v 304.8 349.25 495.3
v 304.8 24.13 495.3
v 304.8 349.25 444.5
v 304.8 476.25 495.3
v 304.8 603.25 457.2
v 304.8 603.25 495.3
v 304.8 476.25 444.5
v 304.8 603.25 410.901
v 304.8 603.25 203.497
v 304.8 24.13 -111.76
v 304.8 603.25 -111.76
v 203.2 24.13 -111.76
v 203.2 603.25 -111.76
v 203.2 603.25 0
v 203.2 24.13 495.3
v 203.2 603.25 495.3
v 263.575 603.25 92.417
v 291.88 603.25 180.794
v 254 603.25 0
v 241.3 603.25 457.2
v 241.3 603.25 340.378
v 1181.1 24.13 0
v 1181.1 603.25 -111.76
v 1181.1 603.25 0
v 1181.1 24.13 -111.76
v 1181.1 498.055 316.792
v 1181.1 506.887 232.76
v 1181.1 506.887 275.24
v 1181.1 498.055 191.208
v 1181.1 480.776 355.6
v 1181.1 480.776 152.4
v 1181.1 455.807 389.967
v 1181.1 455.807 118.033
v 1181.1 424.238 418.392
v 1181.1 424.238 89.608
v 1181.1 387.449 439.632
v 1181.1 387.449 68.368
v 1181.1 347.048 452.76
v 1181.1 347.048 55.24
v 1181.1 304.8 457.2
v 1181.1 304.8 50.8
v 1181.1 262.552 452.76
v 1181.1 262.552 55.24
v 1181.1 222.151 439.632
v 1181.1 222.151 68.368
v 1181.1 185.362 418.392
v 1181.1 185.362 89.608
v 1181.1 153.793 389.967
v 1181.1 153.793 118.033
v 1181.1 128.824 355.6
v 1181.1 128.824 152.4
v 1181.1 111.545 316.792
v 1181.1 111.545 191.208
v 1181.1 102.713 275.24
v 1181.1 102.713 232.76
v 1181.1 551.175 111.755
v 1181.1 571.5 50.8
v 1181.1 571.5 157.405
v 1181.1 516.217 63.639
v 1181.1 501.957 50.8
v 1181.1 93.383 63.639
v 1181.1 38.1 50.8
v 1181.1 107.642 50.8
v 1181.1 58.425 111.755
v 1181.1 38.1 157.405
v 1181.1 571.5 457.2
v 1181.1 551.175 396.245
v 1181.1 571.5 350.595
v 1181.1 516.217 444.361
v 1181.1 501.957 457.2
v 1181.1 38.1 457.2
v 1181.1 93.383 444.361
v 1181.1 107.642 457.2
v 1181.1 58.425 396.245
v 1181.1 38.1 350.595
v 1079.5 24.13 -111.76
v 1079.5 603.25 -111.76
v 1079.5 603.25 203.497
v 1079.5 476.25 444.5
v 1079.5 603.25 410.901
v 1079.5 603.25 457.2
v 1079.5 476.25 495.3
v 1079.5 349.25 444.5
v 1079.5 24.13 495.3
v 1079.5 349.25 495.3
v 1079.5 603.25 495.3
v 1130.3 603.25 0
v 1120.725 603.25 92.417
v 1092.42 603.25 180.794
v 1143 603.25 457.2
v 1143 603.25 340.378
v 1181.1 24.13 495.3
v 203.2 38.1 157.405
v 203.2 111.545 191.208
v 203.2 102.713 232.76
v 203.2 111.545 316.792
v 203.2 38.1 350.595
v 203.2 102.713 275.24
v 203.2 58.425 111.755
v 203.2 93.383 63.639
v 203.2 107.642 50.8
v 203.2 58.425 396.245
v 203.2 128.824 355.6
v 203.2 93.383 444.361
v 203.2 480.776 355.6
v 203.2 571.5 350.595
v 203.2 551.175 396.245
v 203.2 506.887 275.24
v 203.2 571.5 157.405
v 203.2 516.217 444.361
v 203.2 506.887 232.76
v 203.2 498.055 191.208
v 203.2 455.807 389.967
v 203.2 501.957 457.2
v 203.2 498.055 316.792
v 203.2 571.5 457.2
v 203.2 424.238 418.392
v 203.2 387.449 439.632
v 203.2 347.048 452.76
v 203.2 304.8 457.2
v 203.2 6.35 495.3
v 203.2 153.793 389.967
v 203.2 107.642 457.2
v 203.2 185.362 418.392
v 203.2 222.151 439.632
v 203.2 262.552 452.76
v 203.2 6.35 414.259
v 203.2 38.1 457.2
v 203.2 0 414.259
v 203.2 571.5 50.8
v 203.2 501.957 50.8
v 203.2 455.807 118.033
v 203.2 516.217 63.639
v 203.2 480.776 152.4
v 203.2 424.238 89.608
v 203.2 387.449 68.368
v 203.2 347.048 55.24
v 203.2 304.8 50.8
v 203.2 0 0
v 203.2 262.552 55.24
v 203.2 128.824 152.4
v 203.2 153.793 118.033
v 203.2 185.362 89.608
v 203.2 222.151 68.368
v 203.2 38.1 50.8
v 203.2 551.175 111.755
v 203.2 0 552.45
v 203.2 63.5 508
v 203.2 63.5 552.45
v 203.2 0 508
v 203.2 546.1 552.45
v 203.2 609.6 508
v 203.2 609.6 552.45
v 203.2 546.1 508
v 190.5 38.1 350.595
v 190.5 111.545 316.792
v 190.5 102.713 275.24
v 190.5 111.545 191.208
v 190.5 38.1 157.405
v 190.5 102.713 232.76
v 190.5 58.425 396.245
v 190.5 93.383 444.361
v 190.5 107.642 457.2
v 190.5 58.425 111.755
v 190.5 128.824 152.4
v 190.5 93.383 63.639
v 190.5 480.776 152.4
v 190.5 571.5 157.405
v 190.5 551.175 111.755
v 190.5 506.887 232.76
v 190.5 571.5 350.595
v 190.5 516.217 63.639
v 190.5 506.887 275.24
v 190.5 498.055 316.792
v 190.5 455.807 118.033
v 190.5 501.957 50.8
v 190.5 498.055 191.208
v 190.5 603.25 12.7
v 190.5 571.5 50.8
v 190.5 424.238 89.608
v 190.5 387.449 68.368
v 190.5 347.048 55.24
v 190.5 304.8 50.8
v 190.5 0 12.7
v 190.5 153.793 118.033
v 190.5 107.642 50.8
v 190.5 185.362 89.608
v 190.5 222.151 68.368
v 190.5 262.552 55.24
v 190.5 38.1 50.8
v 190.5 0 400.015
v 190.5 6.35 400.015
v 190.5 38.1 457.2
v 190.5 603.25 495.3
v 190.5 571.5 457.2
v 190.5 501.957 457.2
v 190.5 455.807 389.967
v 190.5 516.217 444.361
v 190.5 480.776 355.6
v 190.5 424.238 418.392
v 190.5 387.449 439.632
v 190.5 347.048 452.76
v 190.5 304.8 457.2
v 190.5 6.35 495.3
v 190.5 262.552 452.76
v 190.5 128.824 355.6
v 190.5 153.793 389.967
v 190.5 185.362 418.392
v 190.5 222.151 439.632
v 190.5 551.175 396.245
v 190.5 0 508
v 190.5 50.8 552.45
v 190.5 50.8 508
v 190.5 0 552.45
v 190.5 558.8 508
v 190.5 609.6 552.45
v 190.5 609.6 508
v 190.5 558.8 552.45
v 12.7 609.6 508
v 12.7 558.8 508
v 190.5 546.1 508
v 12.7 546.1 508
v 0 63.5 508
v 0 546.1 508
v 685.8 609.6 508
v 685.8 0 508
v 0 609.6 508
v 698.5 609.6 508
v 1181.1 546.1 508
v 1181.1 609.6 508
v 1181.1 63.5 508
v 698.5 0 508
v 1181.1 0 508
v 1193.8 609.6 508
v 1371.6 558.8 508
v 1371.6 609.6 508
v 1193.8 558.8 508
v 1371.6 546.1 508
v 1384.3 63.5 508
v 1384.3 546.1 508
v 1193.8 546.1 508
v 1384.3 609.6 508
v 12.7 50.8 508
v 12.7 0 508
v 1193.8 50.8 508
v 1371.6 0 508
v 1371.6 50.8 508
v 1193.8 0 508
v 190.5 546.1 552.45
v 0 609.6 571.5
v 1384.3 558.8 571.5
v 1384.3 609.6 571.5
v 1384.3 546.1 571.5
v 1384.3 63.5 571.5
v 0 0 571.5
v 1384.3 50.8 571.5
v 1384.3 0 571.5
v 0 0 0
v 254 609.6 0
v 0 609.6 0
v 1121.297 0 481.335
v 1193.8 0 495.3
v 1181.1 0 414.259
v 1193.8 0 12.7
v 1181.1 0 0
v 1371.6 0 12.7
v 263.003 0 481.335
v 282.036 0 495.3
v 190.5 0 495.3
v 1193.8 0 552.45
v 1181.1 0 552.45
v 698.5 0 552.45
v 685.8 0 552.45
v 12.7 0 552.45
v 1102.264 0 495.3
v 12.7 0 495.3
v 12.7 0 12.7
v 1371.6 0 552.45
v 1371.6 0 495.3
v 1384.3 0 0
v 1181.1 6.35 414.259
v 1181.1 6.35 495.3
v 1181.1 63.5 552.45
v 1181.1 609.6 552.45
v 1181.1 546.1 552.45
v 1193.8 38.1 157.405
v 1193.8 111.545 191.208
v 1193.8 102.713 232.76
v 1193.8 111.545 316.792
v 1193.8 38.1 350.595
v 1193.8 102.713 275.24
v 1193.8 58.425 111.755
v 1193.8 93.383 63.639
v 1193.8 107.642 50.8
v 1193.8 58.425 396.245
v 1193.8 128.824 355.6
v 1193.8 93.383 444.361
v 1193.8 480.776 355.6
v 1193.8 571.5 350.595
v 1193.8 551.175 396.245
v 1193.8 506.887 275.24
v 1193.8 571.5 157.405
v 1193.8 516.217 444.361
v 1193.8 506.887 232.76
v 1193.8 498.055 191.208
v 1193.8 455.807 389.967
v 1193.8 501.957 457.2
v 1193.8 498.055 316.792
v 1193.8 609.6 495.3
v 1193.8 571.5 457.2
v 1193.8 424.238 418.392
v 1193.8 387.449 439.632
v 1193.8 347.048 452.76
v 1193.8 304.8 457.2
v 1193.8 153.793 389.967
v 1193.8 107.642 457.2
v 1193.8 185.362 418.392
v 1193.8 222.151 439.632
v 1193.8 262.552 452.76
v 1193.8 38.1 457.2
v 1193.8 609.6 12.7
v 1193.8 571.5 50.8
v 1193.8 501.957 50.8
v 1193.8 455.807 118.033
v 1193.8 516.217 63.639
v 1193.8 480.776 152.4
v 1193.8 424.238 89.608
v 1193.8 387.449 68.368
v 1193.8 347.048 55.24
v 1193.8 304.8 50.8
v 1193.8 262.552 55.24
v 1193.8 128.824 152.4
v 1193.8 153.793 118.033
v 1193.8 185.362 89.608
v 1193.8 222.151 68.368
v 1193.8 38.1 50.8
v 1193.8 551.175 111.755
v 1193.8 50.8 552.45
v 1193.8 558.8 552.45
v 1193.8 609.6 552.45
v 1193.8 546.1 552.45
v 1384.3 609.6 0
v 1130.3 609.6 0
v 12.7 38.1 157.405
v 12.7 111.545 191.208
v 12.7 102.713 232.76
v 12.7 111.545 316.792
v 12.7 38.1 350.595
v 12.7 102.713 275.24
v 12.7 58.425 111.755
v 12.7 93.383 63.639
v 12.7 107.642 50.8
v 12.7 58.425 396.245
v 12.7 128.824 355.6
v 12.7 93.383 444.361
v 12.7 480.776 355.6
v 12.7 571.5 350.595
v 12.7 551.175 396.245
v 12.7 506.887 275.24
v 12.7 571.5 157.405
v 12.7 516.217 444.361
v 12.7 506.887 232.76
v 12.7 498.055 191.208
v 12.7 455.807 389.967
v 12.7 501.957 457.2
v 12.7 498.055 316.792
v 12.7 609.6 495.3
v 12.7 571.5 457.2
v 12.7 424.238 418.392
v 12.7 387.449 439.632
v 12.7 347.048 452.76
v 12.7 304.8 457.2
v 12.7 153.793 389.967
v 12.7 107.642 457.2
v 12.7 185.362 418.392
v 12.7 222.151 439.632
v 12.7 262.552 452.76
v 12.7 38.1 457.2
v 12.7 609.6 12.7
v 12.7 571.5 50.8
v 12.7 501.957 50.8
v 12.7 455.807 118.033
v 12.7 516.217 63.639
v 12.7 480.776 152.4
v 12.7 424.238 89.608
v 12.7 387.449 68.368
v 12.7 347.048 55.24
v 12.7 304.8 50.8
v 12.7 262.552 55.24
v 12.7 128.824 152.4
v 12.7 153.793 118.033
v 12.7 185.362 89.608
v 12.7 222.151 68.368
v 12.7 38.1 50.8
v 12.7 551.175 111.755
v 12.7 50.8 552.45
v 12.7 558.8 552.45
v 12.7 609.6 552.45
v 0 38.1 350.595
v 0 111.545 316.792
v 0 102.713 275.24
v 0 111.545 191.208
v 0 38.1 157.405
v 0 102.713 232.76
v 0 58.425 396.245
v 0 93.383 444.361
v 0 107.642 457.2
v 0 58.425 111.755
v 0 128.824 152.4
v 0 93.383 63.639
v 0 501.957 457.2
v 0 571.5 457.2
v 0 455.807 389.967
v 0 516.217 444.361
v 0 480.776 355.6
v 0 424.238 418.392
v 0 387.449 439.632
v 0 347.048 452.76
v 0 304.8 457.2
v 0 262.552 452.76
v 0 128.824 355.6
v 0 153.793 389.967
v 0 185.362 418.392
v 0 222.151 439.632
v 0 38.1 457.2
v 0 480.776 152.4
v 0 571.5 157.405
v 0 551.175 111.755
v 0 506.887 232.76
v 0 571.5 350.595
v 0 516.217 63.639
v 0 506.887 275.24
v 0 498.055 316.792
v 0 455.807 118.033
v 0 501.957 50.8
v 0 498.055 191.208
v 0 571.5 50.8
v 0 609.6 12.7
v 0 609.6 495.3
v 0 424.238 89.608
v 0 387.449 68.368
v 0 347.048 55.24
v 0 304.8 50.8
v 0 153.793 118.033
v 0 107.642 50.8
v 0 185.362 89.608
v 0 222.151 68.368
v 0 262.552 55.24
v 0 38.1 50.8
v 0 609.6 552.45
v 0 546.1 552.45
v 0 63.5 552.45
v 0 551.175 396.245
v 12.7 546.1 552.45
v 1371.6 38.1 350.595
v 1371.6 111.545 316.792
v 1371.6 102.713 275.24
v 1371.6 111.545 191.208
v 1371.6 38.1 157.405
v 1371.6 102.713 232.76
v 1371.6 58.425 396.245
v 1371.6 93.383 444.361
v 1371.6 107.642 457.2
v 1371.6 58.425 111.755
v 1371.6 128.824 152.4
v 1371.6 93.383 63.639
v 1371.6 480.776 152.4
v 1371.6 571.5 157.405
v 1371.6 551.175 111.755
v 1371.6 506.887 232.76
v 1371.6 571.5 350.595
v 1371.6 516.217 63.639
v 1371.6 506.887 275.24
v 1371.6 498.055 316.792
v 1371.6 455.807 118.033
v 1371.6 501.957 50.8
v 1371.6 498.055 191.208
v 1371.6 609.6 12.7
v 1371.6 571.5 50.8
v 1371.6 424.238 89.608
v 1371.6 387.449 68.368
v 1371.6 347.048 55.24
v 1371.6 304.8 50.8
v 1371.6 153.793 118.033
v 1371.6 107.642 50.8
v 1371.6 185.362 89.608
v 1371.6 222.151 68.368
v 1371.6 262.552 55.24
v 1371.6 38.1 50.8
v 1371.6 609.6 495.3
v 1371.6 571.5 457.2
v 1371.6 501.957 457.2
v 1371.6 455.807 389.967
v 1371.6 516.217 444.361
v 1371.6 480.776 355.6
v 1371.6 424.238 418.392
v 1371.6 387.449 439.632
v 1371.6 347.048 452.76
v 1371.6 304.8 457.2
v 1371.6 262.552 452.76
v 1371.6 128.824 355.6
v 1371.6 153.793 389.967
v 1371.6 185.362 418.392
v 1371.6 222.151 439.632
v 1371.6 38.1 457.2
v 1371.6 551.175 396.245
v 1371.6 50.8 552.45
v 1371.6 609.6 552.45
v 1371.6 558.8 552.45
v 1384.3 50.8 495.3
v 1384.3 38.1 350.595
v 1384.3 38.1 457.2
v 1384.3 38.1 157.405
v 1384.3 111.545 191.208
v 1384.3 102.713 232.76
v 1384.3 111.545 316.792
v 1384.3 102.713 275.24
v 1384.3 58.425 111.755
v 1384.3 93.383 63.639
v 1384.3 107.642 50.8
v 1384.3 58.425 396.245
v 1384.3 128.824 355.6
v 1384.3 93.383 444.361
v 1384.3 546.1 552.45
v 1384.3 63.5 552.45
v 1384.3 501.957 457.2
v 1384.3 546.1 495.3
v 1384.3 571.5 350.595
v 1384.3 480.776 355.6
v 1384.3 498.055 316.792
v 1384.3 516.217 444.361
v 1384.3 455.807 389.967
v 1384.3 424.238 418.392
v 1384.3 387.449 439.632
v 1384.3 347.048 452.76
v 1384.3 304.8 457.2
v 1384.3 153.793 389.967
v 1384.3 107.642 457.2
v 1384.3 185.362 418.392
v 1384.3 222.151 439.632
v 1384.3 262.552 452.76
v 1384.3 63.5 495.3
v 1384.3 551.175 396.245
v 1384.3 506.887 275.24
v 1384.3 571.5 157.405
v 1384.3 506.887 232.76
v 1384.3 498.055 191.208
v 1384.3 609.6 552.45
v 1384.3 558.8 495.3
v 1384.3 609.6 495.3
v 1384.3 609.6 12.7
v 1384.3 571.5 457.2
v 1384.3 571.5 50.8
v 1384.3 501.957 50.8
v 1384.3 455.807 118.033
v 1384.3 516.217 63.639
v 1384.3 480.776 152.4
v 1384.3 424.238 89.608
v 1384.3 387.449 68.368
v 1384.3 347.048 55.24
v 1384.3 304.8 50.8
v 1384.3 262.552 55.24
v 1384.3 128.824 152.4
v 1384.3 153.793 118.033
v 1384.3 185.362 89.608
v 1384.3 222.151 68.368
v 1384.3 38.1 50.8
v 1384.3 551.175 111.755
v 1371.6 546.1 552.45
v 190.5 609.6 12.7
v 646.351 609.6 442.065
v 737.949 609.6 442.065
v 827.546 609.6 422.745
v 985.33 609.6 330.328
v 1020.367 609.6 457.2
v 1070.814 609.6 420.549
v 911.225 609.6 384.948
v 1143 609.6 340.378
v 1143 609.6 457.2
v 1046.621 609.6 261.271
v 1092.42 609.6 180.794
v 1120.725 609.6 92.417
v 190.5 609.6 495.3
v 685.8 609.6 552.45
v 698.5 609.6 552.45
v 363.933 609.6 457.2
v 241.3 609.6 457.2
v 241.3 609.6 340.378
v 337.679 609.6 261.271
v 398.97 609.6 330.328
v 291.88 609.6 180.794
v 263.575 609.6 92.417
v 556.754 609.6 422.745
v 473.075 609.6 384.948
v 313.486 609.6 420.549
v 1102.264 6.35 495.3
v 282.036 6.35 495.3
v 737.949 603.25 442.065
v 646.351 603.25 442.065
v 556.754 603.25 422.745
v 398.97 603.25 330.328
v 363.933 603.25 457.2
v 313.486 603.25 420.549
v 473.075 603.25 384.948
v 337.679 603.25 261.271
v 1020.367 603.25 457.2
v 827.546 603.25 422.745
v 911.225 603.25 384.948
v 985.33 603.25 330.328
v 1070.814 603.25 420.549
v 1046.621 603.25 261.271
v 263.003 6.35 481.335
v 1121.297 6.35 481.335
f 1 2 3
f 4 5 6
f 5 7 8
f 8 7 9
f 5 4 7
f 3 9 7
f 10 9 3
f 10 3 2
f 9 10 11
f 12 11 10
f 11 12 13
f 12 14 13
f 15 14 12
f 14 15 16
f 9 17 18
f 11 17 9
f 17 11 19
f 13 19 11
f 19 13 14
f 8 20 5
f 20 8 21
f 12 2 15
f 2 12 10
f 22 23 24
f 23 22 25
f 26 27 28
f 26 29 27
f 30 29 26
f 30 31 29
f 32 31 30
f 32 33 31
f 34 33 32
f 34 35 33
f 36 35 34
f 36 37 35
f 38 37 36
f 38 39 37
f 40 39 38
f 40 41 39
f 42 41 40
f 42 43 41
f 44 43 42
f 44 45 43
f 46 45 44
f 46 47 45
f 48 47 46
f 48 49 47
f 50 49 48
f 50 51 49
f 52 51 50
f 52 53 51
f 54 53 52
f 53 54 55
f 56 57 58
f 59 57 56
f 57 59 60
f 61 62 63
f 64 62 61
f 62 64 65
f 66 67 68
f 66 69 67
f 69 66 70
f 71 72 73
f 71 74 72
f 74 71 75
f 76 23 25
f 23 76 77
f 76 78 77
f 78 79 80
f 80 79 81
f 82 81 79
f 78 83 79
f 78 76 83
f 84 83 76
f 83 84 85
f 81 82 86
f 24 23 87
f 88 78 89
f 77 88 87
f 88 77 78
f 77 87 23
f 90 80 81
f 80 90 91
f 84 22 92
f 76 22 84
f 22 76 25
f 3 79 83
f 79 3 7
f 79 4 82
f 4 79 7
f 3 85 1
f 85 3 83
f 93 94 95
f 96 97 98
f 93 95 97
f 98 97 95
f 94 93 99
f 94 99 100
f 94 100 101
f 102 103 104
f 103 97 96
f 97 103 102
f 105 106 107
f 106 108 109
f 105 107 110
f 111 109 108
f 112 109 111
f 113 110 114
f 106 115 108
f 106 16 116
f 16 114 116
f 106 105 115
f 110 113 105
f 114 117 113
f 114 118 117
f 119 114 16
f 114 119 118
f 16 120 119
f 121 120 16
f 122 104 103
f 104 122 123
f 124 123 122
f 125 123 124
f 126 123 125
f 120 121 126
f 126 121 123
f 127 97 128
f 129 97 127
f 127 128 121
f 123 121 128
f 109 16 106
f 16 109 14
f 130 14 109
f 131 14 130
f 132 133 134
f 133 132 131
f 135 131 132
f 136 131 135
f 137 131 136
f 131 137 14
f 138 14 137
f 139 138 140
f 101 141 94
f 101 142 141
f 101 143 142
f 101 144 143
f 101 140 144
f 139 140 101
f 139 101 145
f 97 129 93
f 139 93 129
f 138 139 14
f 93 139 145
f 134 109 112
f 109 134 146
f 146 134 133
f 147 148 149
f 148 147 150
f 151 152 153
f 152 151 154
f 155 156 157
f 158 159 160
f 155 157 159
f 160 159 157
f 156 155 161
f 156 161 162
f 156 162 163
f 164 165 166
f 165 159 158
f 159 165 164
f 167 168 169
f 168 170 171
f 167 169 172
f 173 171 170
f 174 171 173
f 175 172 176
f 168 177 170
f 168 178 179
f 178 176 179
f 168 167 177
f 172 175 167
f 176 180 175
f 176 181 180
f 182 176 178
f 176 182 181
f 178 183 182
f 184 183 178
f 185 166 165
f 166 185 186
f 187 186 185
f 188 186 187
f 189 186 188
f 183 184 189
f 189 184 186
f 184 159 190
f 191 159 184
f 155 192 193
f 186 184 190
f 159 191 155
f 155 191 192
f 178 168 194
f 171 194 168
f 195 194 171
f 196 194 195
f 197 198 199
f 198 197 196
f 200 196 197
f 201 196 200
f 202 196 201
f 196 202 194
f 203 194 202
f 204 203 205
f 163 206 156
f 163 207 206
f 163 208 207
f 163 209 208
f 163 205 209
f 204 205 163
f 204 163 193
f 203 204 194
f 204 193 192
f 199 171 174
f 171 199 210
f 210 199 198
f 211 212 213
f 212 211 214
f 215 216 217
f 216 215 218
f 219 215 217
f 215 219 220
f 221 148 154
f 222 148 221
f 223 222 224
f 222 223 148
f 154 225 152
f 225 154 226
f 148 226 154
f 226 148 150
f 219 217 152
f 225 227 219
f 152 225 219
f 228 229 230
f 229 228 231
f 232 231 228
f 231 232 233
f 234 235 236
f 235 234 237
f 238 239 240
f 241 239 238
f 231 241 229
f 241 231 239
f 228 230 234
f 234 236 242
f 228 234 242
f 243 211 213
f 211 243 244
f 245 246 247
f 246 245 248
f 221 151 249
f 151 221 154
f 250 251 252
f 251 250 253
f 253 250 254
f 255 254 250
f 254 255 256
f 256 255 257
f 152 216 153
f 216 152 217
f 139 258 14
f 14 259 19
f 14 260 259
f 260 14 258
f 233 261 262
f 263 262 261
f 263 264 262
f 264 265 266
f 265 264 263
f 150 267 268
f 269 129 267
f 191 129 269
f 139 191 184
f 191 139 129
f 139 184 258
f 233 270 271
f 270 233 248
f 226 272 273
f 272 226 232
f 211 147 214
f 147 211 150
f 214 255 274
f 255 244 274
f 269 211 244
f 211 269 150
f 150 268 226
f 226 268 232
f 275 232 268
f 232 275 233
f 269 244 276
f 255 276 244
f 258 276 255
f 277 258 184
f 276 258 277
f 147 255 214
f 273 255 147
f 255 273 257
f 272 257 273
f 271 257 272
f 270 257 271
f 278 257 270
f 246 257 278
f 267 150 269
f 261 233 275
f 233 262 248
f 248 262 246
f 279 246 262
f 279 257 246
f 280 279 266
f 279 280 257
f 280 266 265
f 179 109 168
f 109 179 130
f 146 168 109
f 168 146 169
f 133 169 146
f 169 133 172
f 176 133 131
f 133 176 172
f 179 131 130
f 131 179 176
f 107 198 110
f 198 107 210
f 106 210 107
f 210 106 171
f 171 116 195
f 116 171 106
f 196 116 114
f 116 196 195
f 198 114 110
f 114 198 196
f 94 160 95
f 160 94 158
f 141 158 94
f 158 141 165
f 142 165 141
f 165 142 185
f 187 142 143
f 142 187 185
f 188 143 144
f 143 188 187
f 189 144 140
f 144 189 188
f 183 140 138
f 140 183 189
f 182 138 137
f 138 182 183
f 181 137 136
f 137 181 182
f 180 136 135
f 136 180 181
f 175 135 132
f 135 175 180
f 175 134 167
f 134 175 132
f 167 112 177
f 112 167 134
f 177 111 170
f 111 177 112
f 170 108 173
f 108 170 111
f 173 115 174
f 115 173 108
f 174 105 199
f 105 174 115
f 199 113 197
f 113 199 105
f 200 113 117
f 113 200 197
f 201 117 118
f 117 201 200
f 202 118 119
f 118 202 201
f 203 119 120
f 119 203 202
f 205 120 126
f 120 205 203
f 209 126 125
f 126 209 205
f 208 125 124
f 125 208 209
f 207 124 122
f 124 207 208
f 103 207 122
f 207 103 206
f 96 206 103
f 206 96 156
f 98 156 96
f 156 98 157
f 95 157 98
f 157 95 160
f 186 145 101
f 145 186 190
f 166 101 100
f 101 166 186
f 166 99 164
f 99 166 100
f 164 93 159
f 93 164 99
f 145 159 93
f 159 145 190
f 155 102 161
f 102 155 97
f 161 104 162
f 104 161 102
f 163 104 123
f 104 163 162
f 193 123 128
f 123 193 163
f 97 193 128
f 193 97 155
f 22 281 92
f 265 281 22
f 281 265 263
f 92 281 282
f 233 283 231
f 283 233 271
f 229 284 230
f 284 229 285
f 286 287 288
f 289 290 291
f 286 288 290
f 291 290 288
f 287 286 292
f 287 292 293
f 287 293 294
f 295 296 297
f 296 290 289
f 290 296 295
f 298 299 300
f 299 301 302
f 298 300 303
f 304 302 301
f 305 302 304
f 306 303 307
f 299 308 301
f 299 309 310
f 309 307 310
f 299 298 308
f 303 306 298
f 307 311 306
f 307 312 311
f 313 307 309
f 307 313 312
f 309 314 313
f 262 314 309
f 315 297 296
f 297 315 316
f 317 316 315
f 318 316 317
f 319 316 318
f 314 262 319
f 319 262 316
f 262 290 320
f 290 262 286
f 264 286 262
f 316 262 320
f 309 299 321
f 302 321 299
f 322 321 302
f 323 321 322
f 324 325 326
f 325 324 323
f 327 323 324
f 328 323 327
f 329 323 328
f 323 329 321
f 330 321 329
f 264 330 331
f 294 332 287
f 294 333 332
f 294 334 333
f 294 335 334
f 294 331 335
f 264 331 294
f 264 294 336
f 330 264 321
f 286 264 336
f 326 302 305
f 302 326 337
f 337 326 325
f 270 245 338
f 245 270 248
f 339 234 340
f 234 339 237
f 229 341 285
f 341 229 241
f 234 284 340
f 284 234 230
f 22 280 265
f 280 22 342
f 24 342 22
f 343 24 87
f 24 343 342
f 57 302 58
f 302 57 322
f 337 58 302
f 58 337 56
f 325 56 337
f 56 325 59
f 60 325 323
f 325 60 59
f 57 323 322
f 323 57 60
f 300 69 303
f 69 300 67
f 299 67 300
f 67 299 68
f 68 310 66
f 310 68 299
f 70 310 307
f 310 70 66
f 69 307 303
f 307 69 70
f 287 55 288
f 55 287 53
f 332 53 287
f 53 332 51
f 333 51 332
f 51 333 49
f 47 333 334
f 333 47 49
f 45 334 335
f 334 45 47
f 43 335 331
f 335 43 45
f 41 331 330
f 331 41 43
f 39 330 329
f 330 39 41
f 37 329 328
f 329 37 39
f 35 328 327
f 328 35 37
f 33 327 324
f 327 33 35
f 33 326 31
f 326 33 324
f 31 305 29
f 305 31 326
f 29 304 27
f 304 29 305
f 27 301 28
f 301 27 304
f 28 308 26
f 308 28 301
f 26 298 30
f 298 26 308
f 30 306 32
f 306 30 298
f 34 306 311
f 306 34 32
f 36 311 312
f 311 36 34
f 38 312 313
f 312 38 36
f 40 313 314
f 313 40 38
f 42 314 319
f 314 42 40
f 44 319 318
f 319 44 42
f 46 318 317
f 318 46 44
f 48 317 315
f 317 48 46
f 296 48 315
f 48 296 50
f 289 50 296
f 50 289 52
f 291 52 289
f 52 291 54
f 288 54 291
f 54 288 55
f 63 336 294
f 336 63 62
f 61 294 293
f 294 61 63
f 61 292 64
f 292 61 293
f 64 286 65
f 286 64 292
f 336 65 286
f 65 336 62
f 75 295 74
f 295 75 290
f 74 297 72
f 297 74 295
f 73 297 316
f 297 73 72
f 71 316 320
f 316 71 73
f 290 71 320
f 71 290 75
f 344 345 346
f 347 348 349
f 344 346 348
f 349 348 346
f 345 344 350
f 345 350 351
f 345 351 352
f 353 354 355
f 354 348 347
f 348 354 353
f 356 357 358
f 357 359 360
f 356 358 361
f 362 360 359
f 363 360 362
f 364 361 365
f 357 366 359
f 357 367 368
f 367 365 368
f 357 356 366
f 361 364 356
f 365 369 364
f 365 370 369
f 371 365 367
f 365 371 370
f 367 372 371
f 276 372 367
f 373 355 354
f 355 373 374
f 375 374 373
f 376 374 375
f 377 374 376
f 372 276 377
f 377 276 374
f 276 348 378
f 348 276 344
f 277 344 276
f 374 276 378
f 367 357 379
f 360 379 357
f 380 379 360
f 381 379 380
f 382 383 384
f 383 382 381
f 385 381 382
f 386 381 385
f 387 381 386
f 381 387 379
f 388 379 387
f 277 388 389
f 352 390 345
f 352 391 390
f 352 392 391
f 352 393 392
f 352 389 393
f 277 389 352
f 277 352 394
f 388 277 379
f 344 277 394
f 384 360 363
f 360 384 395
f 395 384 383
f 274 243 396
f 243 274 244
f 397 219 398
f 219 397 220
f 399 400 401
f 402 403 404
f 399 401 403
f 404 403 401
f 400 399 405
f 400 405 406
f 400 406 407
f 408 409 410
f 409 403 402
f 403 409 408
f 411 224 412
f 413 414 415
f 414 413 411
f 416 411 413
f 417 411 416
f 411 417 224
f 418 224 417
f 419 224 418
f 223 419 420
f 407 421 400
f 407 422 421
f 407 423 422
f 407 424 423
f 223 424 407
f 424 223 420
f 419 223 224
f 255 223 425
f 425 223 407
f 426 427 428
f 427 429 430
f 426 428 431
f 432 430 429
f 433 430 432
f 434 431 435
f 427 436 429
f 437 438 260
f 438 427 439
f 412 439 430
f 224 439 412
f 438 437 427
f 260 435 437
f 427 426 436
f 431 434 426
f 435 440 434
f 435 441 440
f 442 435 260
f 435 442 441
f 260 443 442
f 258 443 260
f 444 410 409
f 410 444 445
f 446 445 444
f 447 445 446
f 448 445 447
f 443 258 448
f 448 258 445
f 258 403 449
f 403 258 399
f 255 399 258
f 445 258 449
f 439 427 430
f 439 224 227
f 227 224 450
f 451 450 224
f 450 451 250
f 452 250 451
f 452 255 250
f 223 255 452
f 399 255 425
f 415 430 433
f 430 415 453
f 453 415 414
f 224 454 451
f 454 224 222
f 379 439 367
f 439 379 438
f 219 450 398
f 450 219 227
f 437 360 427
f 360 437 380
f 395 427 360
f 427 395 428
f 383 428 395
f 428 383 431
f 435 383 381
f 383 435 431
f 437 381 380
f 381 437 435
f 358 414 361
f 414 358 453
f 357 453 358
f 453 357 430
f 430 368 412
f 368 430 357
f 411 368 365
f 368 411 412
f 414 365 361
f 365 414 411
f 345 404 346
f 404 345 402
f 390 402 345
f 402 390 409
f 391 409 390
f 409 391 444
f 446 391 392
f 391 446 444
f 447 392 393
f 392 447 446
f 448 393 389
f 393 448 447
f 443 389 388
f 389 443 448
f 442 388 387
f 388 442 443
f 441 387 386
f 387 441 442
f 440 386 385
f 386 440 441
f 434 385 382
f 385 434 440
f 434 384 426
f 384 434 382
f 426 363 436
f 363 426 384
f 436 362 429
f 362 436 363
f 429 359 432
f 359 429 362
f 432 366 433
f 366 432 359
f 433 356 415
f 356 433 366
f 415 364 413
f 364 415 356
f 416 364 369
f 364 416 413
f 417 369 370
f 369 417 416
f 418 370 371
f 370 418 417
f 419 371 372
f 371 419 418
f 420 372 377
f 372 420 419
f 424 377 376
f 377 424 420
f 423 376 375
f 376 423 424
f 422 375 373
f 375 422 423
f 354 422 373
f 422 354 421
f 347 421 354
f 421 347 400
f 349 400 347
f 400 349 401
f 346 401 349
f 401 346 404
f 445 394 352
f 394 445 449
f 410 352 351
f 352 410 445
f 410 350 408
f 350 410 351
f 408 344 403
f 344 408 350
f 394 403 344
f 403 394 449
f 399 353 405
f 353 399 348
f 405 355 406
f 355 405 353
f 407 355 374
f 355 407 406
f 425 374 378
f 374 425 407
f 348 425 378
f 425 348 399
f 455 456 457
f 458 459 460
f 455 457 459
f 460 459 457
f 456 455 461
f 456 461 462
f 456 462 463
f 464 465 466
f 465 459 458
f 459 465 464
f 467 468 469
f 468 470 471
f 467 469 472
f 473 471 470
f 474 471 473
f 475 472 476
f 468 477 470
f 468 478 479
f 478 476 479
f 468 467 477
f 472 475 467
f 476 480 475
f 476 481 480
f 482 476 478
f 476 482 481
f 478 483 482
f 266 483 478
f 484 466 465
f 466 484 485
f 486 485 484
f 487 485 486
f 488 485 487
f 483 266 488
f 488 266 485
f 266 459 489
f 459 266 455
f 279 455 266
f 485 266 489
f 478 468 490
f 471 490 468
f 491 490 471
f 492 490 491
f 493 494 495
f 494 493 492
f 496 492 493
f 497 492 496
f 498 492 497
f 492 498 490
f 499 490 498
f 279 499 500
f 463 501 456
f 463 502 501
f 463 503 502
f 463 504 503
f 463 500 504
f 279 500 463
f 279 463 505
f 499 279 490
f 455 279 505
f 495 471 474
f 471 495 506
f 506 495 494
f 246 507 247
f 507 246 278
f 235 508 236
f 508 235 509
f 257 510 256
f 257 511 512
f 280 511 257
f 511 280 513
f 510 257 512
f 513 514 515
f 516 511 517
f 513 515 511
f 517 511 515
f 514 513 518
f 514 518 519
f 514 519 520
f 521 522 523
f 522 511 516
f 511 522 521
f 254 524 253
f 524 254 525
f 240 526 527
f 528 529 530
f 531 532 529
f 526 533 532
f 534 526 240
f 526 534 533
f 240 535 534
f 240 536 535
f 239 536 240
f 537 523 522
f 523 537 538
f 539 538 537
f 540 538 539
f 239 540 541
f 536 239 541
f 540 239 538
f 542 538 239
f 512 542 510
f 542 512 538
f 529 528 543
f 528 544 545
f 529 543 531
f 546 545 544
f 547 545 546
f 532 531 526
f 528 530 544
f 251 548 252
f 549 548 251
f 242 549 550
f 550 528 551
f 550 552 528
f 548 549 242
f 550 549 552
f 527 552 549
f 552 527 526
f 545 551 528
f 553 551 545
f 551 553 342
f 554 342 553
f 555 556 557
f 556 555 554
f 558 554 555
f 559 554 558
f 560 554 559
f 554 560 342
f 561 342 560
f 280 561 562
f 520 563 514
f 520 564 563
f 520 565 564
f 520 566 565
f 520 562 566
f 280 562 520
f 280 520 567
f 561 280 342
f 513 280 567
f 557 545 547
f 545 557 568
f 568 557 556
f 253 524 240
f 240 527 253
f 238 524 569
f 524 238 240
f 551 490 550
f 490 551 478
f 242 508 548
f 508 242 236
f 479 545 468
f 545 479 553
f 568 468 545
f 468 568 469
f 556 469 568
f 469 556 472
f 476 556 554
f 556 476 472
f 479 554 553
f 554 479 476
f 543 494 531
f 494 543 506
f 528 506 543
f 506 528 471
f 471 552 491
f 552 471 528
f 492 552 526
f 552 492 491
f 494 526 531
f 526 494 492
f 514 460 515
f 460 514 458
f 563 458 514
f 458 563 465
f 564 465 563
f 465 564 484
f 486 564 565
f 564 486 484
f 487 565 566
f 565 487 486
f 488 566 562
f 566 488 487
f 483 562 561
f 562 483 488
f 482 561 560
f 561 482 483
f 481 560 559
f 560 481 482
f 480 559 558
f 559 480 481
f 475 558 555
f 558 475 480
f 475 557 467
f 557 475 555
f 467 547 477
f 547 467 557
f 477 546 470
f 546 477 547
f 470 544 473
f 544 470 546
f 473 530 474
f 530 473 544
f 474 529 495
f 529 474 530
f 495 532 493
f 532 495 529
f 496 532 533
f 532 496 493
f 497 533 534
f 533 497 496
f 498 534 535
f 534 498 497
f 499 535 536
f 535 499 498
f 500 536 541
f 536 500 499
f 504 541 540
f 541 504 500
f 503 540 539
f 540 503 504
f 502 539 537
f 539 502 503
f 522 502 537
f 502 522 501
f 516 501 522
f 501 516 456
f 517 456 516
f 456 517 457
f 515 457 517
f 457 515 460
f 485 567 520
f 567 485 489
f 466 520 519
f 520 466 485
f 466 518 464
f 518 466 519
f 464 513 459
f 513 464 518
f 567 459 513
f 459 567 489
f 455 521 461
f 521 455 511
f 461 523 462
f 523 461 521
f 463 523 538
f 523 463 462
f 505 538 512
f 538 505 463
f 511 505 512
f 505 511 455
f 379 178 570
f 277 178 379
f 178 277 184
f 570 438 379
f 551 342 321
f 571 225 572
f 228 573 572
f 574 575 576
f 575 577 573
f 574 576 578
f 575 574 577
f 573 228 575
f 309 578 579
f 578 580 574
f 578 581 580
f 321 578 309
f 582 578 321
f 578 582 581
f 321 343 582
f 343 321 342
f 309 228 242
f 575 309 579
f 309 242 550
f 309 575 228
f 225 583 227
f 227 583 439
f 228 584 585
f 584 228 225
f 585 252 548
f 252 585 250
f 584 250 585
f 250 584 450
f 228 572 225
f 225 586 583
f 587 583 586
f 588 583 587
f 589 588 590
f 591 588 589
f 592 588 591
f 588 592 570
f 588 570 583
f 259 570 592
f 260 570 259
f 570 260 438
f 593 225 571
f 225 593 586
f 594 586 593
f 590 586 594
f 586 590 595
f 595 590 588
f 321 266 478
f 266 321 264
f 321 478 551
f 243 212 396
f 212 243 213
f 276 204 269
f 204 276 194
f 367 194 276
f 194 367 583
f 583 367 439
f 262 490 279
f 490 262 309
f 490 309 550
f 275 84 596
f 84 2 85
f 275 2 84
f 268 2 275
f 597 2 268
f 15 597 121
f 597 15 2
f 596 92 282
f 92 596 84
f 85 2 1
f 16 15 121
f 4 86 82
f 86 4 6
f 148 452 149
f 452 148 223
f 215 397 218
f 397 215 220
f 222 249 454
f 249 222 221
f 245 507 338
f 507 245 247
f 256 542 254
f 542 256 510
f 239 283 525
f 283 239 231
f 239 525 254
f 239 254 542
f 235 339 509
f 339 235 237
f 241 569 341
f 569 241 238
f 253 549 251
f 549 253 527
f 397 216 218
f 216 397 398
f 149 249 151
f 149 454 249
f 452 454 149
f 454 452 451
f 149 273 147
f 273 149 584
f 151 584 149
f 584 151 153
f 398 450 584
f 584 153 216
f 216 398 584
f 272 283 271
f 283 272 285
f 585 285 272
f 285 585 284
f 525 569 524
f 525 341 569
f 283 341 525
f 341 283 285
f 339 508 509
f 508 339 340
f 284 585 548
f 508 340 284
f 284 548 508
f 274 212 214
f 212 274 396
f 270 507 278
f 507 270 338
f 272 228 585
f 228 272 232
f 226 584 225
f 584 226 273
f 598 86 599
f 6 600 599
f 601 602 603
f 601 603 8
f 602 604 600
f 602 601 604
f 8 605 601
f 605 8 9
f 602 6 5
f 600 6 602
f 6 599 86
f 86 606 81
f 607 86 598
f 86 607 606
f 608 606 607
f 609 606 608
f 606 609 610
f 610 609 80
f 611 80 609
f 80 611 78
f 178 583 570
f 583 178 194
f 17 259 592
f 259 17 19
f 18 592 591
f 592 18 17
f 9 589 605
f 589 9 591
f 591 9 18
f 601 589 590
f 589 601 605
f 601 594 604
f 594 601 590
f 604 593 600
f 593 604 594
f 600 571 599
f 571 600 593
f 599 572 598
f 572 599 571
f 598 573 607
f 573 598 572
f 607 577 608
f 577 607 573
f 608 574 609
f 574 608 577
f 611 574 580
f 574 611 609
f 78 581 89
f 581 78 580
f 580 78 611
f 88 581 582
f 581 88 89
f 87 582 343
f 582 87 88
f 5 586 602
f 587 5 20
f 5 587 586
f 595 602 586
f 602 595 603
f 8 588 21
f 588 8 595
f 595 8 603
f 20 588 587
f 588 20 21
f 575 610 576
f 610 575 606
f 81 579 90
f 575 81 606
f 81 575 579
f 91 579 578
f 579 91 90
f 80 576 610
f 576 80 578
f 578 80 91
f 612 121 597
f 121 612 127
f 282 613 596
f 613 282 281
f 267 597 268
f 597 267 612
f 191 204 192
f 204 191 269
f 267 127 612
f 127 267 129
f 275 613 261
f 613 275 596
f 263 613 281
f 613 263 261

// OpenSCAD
in=25.4; // convert to mm
top_y=24*in;


three_quarter_wood=0.75*in; // actual plywood thicknesses will vary
half_wood=0.5*in;
quarter_wood=0.25*in;

top_wood=three_quarter_wood;
lattice_wood=half_wood;
leg_wood=half_wood;
leg_rack_base_wood=half_wood;
foot_wood=half_wood;
spine_wood=half_wood;
end_rack_wood=half_wood;
front_rack_wood=half_wood;
back_wood=quarter_wood;
front_wood=quarter_wood;

leg_wire_r=1*in;
leg_wall=1.5*in;
leg_wire=4*in;

// rack_standards
// https://en.wikipedia.org/wiki/19-inch_rack#/media/File:Server_rack_rail_dimensions.svg
u=1.75*in;
u_hole_gap=0.625*in;
rack=19*in; // outer
rack_inner=17.75*in;

height=rack+leg_rack_base_wood+top_wood+lattice_wood+u;
top_u_h=height-top_wood-u;

pad=0.1;

top_u_gap=spine_wood;

end_u_depth=26*in;

legroom=rack*2+spine_wood;
top_x=legroom+8*u+leg_wood*4;

echo("height");
echo(height/in);

echo("top_x");
echo(top_x/in);

echo("base x");
echo(legroom/in);

back_wall=2*in;
front_wall=-6*in;


// https://www.imovr.com/imovr-vigor-diy-standing-desk-base.html
base_min_x=46.6*in;
base_max_x=75.4*in;
base_y=22.8*in;
base_min_z=23.9*in;
base_max_z=49.5*in;
base_foot_x=4*in; //?
base_channel_y=5*in;
base_channel_z=2*in;
base_channel_from_back=5*in;

module base_side() {
    cube([base_foot_x,base_y,base_min_z]);
}

module base() {
    translate([leg_wood*2+4*u,top_y-base_y-back_wood,-base_min_z+leg_rack_base_wood+rack]) {
        base_side();
        translate([legroom-base_foot_x,0])
        base_side();
        translate([0,base_y-base_channel_y-base_channel_from_back,base_min_z-base_channel_z])
        cube([legroom,base_channel_y,base_channel_z]);
    }
}

#base();


module u(slots, depth) {
    cube([rack,depth,u*slots]);
}

module top() {
    square([top_x,top_y]);
}

module top_3d() {
    linear_extrude(height=top_wood)
    top();
}

module top_assembled() {
    translate([0,0,height-top_wood])
    top_3d();
}

module lattice() {
    difference() {
        square([top_x,top_y]);
    }
}

module lattice_3d() {
    linear_extrude(height=lattice_wood)
    lattice();
}

module lattice_assembled() {
    translate([0,0,height-top_wood-u-lattice_wood])
    lattice_3d();
}


module front_u(x=0) {
    translate([-rack/2+x,-pad,top_u_h])
    #u(1,top_y+pad*2);
}

module end_u() {
    translate([-pad,rack/2+top_y/2,top_u_h])
    rotate([0,0,-90])
    #u(1,top_y+pad*2);
}

module top_us() {
    front_u(top_x/2-rack/2-top_u_gap/2);
    front_u(top_x/2+rack/2+top_u_gap/2);
    end_u();
    translate([top_x,0,0])
    mirror([1,0,0])
    end_u();
}

module assembled() {
    color("purple")
    top_assembled();
    color("lime")
    lattice_assembled();
    //top_us();
    //leg_us();
    color("red")
    spine_assembled();
    color("red")
    inner_legs_assembled();
    color("blue")
    outer_legs_assembled();
    color("lime")
    leg_rack_bases_assembled();
    color("magenta")
    feet_assembled();
    color("magenta")
    end_racks_assembled();
    color("blue")
    front_racks_assembled();
    color("gray")
    back_assembled();
}


module leg_u() {
    translate([leg_wood,-pad,height-top_wood-u-lattice_wood])
    rotate([0,90,0])
    #u(4,top_y+pad*2);
}

module leg_us() {
    leg_u();
    translate([top_x,0,0])
    mirror([1,0,0])
    leg_u();
}

module leg_wires() {
    wire_corners(rack, top_y, leg_wall, leg_wire);
    circle(d=rack-leg_wall*2);
}

module wire_corners(x,y,wall,open) {
    difference () {
        inx=x-wall*2;
        iny=y-wall*2;
        square([inx,iny],center=true);
        to_corner=sqrt(inx*inx+iny*iny);
        circle(d=to_corner-open);
    }
}

module leg() {
    difference() {
        square([height,top_y]);
        translate([height-top_wood-u,top_y/2-rack/2])
        square([top_wood+u,rack]);
        translate([height-rack/2-top_wood-u-lattice_wood,top_y/2])
        leg_wires();
    }
}

module outer_leg() {
    leg();
}

module inner_leg() {
    leg();
}


module inner_leg_3d() {
    linear_extrude(height=leg_wood)
    inner_leg();
}

module outer_leg_3d() {
    linear_extrude(height=leg_wood)
    outer_leg();
}


module inner_leg_assembled() {
    translate([leg_wood*2+u*4,0,0])
    rotate([0,-90,0])
    inner_leg_3d();
}

module outer_leg_assembled() {
    translate([leg_wood,0,0])
    rotate([0,-90,0])
    outer_leg_3d();
}

module inner_legs_assembled() {
    inner_leg_assembled();
    translate([top_x,0,0])
    mirror([1,0,0])
    inner_leg_assembled();
}

module outer_legs_assembled() {
    outer_leg_assembled();
    translate([top_x,0,0])
    mirror([1,0,0])
    outer_leg_assembled();
}

module leg_rack_base() {
    square([4*u+leg_wood*2,top_y]);
}

module leg_rack_base_3d() {
    linear_extrude(height=leg_rack_base_wood)
    leg_rack_base();
}

module leg_rack_base_assembled() {
    translate([0,0,height-top_wood-u-lattice_wood-rack-leg_rack_base_wood])
    leg_rack_base_3d();
}

module leg_rack_bases_assembled() {
    leg_rack_base_assembled();
    translate([top_x,0,0])
    mirror([1,0,0])
    leg_rack_base_assembled();
}

module foot() { 
    square([4*u+leg_wood*2,top_y]);
}
module foot_3d() {
    linear_extrude(height=foot_wood)
    foot();
}
module foot_assembled() { 
    foot_3d();
}

module feet_assembled() {
    foot_assembled();
    translate([top_x,0,0])
    mirror([1,0,0])
    foot_assembled();
}

module spine() {
    square([top_wood+u+lattice_wood,top_y]);
}

module spine_3d() {
    linear_extrude(height=spine_wood)
    spine();
}

module spine_assembled() {
    translate([spine_wood/2+top_x/2,0,height-top_wood-u-lattice_wood])
    rotate([0,-90,0])
    spine_3d();
}

module end_rack() {
    square([(top_x-rack*2-spine_wood)/2,top_wood+u+lattice_wood]);
}

module end_rack_3d() {
    linear_extrude(height=end_rack_wood)
    end_rack();
}

module end_rack_assembled() {
    translate([0,top_y/2-rack/2-end_rack_wood,height])
    rotate([-90,0,0])
    end_rack_3d();
}

module end_racks_assembled_left() {
    end_rack_assembled();
    translate([0,top_y,0])
    mirror([0,1,0])
    end_rack_assembled();
}

module end_racks_assembled() {
    end_racks_assembled_left();
    translate([top_x,0,0])
    mirror([1,0,0])
    end_racks_assembled_left();
}

module front_rack() {
    square([top_wood+u+lattice_wood,(top_y-rack)/2]);
}

module front_rack_3d() {
    linear_extrude(height=front_rack_wood)
    front_rack();
}

module front_rack_assembled() {
    translate([top_x/2-spine_wood/2-rack-front_rack_wood,0,height])
    rotate([0,90,0])
    front_rack_3d();
}

module front_racks_assembled_left() {
    front_rack_assembled();
    translate([0,top_y,0])
    mirror([0,1,0])
    front_rack_assembled();
}

module front_racks_assembled() {
    front_racks_assembled_left();
    translate([top_x,0,0])
    mirror([1,0,0])
    front_racks_assembled_left();
}
module back_3d() {
    linear_extrude(height=top_wood)
    back();
}

module top_assembled() {
    translate([0,0,height-top_wood])
    top_3d();
}

module lattice() {
    top();
}

module lattice_3d() {
    linear_extrude(height=lattice_wood)
    lattice();
}

module lattice_assembled() {
    translate([0,0,height-top_wood-u-lattice_wood])
    lattice_3d();
}


module front_u(x=0) {
    translate([-rack/2+x,-pad,top_u_h])
    #u(1,top_y+pad*2);
}

module end_u() {
    translate([-pad,rack/2+top_y/2,top_u_h])
    rotate([0,0,-90])
    #u(1,top_y+pad*2);
}

module top_us() {
    front_u(top_x/2-rack/2-top_u_gap/2);
    front_u(top_x/2+rack/2+top_u_gap/2);
    end_u();
    translate([top_x,0,0])
    mirror([1,0,0])
    end_u();
}

module assembled() {
    color("purple")
    top_assembled();
    color("lime")
    lattice_assembled();
    //top_us();
    //leg_us();
    color("red")
    spine_assembled();
    color("red")
    inner_legs_assembled();
    color("blue")
    outer_legs_assembled();
    color("lime")
    leg_rack_bases_assembled();
    //color("magenta")
    //feet_assembled();
    color("magenta")
    end_racks_assembled();
    //color("blue")
    //front_racks_assembled();
    color("gray")
    back_assembled();
    color("tan")
    front_assembled();
}


module leg_u() {
    translate([leg_wood,-pad,height-top_wood-u-lattice_wood])
    rotate([0,90,0])
    #u(4,top_y+pad*2);
}

module leg_us() {
    leg_u();
    translate([top_x,0,0])
    mirror([1,0,0])
    leg_u();
}

module outer_leg() {
    leg();
}

module inner_leg() {
    leg();
}


module inner_leg_3d() {
    linear_extrude(height=leg_wood)
    inner_leg();
}

module outer_leg_3d() {
    linear_extrude(height=leg_wood)
    outer_leg();
}


module inner_leg_assembled() {
    translate([leg_wood*2+u*4,0,0])
    rotate([0,-90,0])
    inner_leg_3d();
}

module outer_leg_assembled() {
    translate([leg_wood,0,0])
    rotate([0,-90,0])
    outer_leg_3d();
}

module inner_legs_assembled() {
    inner_leg_assembled();
    translate([top_x,0,0])
    mirror([1,0,0])
    inner_leg_assembled();
}

module outer_legs_assembled() {
    outer_leg_assembled();
    translate([top_x,0,0])
    mirror([1,0,0])
    outer_leg_assembled();
}

module leg_rack_base() {
    square([4*u+leg_wood*2,top_y]);
}

module leg_rack_base_3d() {
    linear_extrude(height=leg_rack_base_wood)
    leg_rack_base();
}

module leg_rack_base_assembled() {
    translate([0,0,height-top_wood-u-lattice_wood-rack-leg_rack_base_wood])
    leg_rack_base_3d();
}

module leg_rack_bases_assembled() {
    leg_rack_base_assembled();
    translate([top_x,0,0])
    mirror([1,0,0])
    leg_rack_base_assembled();
}

module foot() { 
    square([4*u+leg_wood*2,top_y]);
}
module foot_3d() {
    linear_extrude(height=foot_wood)
    foot();
}
module foot_assembled() { 
    foot_3d();
}

module feet_assembled() {
    foot_assembled();
    translate([top_x,0,0])
    mirror([1,0,0])
    foot_assembled();
}

module spine() {
    square([top_wood+u+lattice_wood,top_y]);
}

module spine_3d() {
    linear_extrude(height=spine_wood)
    spine();
}

module spine_assembled() {
    translate([spine_wood/2+top_x/2,0,height-top_wood-u-lattice_wood])
    rotate([0,-90,0])
    spine_3d();
}

module end_rack() {
    square([(top_x-rack*2-spine_wood)/2,top_wood+u+lattice_wood]);
}

module end_rack_3d() {
    linear_extrude(height=end_rack_wood)
    end_rack();
}

module end_rack_assembled() {
    translate([0,top_y/2-rack/2-end_rack_wood,height])
    rotate([-90,0,0])
    end_rack_3d();
}

module end_racks_assembled_left() {
    end_rack_assembled();
    translate([0,top_y,0])
    mirror([0,1,0])
    end_rack_assembled();
}

module end_racks_assembled() {
    end_racks_assembled_left();
    translate([top_x,0,0])
    mirror([1,0,0])
    end_racks_assembled_left();
}

module front_rack() {
    square([top_wood+u+lattice_wood,(top_y-rack)/2]);
}

module front_rack_3d() {
    linear_extrude(height=front_rack_wood)
    front_rack();
}

module front_rack_assembled() {
    translate([top_x/2-spine_wood/2-rack-front_rack_wood,0,height])
    rotate([0,90,0])
    front_rack_3d();
}

module front_racks_assembled_left() {
    front_rack_assembled();
    translate([0,top_y,0])
    mirror([0,1,0])
    front_rack_assembled();
}

module front_racks_assembled() {
    front_racks_assembled_left();
    translate([top_x,0,0])
    mirror([1,0,0])
    front_racks_assembled_left();
}

back_wire_wall=leg_wall;
back_wire=6*in;

module back() {
    y=height-top_wood-u;
    x=top_x-8*u-leg_wood*2;

    r1=y-back_wall-lattice_wood;
    r2=x/2-leg_wood-back_wall;
    difference() {
        square([x,y]);
        translate([x/2,0])
        scale([r2/r1,1])
        circle(r=r1);
        translate([x/2,0])
        wire_corners(x-leg_wood*2,y*2-lattice_wood-foot_wood,back_wire_wall,back_wire);
    }
}

module back_3d() {
    linear_extrude(height=back_wood)
    back();
}

module back_assembled() {
    translate([leg_wood+4*u,top_y,0])
    rotate([90,0,0])
    back_3d();
}

module front() {
    y=height-top_wood-u;
    x=top_x-8*u-leg_wood*2;

    r1=y-front_wall-lattice_wood;
    r2=x/2-leg_wood-front_wall;
    difference() {
        square([x,y]);
        translate([x/2,0])
        scale([r2/r1,1])
        circle(r=r1);
    }
}

module front_3d() {
    linear_extrude(height=back_wood)
    front();
}

module front_assembled() {
    translate([leg_wood+4*u,front_wood,0])
    rotate([90,0,0])
    front_3d();
}


assembled();
